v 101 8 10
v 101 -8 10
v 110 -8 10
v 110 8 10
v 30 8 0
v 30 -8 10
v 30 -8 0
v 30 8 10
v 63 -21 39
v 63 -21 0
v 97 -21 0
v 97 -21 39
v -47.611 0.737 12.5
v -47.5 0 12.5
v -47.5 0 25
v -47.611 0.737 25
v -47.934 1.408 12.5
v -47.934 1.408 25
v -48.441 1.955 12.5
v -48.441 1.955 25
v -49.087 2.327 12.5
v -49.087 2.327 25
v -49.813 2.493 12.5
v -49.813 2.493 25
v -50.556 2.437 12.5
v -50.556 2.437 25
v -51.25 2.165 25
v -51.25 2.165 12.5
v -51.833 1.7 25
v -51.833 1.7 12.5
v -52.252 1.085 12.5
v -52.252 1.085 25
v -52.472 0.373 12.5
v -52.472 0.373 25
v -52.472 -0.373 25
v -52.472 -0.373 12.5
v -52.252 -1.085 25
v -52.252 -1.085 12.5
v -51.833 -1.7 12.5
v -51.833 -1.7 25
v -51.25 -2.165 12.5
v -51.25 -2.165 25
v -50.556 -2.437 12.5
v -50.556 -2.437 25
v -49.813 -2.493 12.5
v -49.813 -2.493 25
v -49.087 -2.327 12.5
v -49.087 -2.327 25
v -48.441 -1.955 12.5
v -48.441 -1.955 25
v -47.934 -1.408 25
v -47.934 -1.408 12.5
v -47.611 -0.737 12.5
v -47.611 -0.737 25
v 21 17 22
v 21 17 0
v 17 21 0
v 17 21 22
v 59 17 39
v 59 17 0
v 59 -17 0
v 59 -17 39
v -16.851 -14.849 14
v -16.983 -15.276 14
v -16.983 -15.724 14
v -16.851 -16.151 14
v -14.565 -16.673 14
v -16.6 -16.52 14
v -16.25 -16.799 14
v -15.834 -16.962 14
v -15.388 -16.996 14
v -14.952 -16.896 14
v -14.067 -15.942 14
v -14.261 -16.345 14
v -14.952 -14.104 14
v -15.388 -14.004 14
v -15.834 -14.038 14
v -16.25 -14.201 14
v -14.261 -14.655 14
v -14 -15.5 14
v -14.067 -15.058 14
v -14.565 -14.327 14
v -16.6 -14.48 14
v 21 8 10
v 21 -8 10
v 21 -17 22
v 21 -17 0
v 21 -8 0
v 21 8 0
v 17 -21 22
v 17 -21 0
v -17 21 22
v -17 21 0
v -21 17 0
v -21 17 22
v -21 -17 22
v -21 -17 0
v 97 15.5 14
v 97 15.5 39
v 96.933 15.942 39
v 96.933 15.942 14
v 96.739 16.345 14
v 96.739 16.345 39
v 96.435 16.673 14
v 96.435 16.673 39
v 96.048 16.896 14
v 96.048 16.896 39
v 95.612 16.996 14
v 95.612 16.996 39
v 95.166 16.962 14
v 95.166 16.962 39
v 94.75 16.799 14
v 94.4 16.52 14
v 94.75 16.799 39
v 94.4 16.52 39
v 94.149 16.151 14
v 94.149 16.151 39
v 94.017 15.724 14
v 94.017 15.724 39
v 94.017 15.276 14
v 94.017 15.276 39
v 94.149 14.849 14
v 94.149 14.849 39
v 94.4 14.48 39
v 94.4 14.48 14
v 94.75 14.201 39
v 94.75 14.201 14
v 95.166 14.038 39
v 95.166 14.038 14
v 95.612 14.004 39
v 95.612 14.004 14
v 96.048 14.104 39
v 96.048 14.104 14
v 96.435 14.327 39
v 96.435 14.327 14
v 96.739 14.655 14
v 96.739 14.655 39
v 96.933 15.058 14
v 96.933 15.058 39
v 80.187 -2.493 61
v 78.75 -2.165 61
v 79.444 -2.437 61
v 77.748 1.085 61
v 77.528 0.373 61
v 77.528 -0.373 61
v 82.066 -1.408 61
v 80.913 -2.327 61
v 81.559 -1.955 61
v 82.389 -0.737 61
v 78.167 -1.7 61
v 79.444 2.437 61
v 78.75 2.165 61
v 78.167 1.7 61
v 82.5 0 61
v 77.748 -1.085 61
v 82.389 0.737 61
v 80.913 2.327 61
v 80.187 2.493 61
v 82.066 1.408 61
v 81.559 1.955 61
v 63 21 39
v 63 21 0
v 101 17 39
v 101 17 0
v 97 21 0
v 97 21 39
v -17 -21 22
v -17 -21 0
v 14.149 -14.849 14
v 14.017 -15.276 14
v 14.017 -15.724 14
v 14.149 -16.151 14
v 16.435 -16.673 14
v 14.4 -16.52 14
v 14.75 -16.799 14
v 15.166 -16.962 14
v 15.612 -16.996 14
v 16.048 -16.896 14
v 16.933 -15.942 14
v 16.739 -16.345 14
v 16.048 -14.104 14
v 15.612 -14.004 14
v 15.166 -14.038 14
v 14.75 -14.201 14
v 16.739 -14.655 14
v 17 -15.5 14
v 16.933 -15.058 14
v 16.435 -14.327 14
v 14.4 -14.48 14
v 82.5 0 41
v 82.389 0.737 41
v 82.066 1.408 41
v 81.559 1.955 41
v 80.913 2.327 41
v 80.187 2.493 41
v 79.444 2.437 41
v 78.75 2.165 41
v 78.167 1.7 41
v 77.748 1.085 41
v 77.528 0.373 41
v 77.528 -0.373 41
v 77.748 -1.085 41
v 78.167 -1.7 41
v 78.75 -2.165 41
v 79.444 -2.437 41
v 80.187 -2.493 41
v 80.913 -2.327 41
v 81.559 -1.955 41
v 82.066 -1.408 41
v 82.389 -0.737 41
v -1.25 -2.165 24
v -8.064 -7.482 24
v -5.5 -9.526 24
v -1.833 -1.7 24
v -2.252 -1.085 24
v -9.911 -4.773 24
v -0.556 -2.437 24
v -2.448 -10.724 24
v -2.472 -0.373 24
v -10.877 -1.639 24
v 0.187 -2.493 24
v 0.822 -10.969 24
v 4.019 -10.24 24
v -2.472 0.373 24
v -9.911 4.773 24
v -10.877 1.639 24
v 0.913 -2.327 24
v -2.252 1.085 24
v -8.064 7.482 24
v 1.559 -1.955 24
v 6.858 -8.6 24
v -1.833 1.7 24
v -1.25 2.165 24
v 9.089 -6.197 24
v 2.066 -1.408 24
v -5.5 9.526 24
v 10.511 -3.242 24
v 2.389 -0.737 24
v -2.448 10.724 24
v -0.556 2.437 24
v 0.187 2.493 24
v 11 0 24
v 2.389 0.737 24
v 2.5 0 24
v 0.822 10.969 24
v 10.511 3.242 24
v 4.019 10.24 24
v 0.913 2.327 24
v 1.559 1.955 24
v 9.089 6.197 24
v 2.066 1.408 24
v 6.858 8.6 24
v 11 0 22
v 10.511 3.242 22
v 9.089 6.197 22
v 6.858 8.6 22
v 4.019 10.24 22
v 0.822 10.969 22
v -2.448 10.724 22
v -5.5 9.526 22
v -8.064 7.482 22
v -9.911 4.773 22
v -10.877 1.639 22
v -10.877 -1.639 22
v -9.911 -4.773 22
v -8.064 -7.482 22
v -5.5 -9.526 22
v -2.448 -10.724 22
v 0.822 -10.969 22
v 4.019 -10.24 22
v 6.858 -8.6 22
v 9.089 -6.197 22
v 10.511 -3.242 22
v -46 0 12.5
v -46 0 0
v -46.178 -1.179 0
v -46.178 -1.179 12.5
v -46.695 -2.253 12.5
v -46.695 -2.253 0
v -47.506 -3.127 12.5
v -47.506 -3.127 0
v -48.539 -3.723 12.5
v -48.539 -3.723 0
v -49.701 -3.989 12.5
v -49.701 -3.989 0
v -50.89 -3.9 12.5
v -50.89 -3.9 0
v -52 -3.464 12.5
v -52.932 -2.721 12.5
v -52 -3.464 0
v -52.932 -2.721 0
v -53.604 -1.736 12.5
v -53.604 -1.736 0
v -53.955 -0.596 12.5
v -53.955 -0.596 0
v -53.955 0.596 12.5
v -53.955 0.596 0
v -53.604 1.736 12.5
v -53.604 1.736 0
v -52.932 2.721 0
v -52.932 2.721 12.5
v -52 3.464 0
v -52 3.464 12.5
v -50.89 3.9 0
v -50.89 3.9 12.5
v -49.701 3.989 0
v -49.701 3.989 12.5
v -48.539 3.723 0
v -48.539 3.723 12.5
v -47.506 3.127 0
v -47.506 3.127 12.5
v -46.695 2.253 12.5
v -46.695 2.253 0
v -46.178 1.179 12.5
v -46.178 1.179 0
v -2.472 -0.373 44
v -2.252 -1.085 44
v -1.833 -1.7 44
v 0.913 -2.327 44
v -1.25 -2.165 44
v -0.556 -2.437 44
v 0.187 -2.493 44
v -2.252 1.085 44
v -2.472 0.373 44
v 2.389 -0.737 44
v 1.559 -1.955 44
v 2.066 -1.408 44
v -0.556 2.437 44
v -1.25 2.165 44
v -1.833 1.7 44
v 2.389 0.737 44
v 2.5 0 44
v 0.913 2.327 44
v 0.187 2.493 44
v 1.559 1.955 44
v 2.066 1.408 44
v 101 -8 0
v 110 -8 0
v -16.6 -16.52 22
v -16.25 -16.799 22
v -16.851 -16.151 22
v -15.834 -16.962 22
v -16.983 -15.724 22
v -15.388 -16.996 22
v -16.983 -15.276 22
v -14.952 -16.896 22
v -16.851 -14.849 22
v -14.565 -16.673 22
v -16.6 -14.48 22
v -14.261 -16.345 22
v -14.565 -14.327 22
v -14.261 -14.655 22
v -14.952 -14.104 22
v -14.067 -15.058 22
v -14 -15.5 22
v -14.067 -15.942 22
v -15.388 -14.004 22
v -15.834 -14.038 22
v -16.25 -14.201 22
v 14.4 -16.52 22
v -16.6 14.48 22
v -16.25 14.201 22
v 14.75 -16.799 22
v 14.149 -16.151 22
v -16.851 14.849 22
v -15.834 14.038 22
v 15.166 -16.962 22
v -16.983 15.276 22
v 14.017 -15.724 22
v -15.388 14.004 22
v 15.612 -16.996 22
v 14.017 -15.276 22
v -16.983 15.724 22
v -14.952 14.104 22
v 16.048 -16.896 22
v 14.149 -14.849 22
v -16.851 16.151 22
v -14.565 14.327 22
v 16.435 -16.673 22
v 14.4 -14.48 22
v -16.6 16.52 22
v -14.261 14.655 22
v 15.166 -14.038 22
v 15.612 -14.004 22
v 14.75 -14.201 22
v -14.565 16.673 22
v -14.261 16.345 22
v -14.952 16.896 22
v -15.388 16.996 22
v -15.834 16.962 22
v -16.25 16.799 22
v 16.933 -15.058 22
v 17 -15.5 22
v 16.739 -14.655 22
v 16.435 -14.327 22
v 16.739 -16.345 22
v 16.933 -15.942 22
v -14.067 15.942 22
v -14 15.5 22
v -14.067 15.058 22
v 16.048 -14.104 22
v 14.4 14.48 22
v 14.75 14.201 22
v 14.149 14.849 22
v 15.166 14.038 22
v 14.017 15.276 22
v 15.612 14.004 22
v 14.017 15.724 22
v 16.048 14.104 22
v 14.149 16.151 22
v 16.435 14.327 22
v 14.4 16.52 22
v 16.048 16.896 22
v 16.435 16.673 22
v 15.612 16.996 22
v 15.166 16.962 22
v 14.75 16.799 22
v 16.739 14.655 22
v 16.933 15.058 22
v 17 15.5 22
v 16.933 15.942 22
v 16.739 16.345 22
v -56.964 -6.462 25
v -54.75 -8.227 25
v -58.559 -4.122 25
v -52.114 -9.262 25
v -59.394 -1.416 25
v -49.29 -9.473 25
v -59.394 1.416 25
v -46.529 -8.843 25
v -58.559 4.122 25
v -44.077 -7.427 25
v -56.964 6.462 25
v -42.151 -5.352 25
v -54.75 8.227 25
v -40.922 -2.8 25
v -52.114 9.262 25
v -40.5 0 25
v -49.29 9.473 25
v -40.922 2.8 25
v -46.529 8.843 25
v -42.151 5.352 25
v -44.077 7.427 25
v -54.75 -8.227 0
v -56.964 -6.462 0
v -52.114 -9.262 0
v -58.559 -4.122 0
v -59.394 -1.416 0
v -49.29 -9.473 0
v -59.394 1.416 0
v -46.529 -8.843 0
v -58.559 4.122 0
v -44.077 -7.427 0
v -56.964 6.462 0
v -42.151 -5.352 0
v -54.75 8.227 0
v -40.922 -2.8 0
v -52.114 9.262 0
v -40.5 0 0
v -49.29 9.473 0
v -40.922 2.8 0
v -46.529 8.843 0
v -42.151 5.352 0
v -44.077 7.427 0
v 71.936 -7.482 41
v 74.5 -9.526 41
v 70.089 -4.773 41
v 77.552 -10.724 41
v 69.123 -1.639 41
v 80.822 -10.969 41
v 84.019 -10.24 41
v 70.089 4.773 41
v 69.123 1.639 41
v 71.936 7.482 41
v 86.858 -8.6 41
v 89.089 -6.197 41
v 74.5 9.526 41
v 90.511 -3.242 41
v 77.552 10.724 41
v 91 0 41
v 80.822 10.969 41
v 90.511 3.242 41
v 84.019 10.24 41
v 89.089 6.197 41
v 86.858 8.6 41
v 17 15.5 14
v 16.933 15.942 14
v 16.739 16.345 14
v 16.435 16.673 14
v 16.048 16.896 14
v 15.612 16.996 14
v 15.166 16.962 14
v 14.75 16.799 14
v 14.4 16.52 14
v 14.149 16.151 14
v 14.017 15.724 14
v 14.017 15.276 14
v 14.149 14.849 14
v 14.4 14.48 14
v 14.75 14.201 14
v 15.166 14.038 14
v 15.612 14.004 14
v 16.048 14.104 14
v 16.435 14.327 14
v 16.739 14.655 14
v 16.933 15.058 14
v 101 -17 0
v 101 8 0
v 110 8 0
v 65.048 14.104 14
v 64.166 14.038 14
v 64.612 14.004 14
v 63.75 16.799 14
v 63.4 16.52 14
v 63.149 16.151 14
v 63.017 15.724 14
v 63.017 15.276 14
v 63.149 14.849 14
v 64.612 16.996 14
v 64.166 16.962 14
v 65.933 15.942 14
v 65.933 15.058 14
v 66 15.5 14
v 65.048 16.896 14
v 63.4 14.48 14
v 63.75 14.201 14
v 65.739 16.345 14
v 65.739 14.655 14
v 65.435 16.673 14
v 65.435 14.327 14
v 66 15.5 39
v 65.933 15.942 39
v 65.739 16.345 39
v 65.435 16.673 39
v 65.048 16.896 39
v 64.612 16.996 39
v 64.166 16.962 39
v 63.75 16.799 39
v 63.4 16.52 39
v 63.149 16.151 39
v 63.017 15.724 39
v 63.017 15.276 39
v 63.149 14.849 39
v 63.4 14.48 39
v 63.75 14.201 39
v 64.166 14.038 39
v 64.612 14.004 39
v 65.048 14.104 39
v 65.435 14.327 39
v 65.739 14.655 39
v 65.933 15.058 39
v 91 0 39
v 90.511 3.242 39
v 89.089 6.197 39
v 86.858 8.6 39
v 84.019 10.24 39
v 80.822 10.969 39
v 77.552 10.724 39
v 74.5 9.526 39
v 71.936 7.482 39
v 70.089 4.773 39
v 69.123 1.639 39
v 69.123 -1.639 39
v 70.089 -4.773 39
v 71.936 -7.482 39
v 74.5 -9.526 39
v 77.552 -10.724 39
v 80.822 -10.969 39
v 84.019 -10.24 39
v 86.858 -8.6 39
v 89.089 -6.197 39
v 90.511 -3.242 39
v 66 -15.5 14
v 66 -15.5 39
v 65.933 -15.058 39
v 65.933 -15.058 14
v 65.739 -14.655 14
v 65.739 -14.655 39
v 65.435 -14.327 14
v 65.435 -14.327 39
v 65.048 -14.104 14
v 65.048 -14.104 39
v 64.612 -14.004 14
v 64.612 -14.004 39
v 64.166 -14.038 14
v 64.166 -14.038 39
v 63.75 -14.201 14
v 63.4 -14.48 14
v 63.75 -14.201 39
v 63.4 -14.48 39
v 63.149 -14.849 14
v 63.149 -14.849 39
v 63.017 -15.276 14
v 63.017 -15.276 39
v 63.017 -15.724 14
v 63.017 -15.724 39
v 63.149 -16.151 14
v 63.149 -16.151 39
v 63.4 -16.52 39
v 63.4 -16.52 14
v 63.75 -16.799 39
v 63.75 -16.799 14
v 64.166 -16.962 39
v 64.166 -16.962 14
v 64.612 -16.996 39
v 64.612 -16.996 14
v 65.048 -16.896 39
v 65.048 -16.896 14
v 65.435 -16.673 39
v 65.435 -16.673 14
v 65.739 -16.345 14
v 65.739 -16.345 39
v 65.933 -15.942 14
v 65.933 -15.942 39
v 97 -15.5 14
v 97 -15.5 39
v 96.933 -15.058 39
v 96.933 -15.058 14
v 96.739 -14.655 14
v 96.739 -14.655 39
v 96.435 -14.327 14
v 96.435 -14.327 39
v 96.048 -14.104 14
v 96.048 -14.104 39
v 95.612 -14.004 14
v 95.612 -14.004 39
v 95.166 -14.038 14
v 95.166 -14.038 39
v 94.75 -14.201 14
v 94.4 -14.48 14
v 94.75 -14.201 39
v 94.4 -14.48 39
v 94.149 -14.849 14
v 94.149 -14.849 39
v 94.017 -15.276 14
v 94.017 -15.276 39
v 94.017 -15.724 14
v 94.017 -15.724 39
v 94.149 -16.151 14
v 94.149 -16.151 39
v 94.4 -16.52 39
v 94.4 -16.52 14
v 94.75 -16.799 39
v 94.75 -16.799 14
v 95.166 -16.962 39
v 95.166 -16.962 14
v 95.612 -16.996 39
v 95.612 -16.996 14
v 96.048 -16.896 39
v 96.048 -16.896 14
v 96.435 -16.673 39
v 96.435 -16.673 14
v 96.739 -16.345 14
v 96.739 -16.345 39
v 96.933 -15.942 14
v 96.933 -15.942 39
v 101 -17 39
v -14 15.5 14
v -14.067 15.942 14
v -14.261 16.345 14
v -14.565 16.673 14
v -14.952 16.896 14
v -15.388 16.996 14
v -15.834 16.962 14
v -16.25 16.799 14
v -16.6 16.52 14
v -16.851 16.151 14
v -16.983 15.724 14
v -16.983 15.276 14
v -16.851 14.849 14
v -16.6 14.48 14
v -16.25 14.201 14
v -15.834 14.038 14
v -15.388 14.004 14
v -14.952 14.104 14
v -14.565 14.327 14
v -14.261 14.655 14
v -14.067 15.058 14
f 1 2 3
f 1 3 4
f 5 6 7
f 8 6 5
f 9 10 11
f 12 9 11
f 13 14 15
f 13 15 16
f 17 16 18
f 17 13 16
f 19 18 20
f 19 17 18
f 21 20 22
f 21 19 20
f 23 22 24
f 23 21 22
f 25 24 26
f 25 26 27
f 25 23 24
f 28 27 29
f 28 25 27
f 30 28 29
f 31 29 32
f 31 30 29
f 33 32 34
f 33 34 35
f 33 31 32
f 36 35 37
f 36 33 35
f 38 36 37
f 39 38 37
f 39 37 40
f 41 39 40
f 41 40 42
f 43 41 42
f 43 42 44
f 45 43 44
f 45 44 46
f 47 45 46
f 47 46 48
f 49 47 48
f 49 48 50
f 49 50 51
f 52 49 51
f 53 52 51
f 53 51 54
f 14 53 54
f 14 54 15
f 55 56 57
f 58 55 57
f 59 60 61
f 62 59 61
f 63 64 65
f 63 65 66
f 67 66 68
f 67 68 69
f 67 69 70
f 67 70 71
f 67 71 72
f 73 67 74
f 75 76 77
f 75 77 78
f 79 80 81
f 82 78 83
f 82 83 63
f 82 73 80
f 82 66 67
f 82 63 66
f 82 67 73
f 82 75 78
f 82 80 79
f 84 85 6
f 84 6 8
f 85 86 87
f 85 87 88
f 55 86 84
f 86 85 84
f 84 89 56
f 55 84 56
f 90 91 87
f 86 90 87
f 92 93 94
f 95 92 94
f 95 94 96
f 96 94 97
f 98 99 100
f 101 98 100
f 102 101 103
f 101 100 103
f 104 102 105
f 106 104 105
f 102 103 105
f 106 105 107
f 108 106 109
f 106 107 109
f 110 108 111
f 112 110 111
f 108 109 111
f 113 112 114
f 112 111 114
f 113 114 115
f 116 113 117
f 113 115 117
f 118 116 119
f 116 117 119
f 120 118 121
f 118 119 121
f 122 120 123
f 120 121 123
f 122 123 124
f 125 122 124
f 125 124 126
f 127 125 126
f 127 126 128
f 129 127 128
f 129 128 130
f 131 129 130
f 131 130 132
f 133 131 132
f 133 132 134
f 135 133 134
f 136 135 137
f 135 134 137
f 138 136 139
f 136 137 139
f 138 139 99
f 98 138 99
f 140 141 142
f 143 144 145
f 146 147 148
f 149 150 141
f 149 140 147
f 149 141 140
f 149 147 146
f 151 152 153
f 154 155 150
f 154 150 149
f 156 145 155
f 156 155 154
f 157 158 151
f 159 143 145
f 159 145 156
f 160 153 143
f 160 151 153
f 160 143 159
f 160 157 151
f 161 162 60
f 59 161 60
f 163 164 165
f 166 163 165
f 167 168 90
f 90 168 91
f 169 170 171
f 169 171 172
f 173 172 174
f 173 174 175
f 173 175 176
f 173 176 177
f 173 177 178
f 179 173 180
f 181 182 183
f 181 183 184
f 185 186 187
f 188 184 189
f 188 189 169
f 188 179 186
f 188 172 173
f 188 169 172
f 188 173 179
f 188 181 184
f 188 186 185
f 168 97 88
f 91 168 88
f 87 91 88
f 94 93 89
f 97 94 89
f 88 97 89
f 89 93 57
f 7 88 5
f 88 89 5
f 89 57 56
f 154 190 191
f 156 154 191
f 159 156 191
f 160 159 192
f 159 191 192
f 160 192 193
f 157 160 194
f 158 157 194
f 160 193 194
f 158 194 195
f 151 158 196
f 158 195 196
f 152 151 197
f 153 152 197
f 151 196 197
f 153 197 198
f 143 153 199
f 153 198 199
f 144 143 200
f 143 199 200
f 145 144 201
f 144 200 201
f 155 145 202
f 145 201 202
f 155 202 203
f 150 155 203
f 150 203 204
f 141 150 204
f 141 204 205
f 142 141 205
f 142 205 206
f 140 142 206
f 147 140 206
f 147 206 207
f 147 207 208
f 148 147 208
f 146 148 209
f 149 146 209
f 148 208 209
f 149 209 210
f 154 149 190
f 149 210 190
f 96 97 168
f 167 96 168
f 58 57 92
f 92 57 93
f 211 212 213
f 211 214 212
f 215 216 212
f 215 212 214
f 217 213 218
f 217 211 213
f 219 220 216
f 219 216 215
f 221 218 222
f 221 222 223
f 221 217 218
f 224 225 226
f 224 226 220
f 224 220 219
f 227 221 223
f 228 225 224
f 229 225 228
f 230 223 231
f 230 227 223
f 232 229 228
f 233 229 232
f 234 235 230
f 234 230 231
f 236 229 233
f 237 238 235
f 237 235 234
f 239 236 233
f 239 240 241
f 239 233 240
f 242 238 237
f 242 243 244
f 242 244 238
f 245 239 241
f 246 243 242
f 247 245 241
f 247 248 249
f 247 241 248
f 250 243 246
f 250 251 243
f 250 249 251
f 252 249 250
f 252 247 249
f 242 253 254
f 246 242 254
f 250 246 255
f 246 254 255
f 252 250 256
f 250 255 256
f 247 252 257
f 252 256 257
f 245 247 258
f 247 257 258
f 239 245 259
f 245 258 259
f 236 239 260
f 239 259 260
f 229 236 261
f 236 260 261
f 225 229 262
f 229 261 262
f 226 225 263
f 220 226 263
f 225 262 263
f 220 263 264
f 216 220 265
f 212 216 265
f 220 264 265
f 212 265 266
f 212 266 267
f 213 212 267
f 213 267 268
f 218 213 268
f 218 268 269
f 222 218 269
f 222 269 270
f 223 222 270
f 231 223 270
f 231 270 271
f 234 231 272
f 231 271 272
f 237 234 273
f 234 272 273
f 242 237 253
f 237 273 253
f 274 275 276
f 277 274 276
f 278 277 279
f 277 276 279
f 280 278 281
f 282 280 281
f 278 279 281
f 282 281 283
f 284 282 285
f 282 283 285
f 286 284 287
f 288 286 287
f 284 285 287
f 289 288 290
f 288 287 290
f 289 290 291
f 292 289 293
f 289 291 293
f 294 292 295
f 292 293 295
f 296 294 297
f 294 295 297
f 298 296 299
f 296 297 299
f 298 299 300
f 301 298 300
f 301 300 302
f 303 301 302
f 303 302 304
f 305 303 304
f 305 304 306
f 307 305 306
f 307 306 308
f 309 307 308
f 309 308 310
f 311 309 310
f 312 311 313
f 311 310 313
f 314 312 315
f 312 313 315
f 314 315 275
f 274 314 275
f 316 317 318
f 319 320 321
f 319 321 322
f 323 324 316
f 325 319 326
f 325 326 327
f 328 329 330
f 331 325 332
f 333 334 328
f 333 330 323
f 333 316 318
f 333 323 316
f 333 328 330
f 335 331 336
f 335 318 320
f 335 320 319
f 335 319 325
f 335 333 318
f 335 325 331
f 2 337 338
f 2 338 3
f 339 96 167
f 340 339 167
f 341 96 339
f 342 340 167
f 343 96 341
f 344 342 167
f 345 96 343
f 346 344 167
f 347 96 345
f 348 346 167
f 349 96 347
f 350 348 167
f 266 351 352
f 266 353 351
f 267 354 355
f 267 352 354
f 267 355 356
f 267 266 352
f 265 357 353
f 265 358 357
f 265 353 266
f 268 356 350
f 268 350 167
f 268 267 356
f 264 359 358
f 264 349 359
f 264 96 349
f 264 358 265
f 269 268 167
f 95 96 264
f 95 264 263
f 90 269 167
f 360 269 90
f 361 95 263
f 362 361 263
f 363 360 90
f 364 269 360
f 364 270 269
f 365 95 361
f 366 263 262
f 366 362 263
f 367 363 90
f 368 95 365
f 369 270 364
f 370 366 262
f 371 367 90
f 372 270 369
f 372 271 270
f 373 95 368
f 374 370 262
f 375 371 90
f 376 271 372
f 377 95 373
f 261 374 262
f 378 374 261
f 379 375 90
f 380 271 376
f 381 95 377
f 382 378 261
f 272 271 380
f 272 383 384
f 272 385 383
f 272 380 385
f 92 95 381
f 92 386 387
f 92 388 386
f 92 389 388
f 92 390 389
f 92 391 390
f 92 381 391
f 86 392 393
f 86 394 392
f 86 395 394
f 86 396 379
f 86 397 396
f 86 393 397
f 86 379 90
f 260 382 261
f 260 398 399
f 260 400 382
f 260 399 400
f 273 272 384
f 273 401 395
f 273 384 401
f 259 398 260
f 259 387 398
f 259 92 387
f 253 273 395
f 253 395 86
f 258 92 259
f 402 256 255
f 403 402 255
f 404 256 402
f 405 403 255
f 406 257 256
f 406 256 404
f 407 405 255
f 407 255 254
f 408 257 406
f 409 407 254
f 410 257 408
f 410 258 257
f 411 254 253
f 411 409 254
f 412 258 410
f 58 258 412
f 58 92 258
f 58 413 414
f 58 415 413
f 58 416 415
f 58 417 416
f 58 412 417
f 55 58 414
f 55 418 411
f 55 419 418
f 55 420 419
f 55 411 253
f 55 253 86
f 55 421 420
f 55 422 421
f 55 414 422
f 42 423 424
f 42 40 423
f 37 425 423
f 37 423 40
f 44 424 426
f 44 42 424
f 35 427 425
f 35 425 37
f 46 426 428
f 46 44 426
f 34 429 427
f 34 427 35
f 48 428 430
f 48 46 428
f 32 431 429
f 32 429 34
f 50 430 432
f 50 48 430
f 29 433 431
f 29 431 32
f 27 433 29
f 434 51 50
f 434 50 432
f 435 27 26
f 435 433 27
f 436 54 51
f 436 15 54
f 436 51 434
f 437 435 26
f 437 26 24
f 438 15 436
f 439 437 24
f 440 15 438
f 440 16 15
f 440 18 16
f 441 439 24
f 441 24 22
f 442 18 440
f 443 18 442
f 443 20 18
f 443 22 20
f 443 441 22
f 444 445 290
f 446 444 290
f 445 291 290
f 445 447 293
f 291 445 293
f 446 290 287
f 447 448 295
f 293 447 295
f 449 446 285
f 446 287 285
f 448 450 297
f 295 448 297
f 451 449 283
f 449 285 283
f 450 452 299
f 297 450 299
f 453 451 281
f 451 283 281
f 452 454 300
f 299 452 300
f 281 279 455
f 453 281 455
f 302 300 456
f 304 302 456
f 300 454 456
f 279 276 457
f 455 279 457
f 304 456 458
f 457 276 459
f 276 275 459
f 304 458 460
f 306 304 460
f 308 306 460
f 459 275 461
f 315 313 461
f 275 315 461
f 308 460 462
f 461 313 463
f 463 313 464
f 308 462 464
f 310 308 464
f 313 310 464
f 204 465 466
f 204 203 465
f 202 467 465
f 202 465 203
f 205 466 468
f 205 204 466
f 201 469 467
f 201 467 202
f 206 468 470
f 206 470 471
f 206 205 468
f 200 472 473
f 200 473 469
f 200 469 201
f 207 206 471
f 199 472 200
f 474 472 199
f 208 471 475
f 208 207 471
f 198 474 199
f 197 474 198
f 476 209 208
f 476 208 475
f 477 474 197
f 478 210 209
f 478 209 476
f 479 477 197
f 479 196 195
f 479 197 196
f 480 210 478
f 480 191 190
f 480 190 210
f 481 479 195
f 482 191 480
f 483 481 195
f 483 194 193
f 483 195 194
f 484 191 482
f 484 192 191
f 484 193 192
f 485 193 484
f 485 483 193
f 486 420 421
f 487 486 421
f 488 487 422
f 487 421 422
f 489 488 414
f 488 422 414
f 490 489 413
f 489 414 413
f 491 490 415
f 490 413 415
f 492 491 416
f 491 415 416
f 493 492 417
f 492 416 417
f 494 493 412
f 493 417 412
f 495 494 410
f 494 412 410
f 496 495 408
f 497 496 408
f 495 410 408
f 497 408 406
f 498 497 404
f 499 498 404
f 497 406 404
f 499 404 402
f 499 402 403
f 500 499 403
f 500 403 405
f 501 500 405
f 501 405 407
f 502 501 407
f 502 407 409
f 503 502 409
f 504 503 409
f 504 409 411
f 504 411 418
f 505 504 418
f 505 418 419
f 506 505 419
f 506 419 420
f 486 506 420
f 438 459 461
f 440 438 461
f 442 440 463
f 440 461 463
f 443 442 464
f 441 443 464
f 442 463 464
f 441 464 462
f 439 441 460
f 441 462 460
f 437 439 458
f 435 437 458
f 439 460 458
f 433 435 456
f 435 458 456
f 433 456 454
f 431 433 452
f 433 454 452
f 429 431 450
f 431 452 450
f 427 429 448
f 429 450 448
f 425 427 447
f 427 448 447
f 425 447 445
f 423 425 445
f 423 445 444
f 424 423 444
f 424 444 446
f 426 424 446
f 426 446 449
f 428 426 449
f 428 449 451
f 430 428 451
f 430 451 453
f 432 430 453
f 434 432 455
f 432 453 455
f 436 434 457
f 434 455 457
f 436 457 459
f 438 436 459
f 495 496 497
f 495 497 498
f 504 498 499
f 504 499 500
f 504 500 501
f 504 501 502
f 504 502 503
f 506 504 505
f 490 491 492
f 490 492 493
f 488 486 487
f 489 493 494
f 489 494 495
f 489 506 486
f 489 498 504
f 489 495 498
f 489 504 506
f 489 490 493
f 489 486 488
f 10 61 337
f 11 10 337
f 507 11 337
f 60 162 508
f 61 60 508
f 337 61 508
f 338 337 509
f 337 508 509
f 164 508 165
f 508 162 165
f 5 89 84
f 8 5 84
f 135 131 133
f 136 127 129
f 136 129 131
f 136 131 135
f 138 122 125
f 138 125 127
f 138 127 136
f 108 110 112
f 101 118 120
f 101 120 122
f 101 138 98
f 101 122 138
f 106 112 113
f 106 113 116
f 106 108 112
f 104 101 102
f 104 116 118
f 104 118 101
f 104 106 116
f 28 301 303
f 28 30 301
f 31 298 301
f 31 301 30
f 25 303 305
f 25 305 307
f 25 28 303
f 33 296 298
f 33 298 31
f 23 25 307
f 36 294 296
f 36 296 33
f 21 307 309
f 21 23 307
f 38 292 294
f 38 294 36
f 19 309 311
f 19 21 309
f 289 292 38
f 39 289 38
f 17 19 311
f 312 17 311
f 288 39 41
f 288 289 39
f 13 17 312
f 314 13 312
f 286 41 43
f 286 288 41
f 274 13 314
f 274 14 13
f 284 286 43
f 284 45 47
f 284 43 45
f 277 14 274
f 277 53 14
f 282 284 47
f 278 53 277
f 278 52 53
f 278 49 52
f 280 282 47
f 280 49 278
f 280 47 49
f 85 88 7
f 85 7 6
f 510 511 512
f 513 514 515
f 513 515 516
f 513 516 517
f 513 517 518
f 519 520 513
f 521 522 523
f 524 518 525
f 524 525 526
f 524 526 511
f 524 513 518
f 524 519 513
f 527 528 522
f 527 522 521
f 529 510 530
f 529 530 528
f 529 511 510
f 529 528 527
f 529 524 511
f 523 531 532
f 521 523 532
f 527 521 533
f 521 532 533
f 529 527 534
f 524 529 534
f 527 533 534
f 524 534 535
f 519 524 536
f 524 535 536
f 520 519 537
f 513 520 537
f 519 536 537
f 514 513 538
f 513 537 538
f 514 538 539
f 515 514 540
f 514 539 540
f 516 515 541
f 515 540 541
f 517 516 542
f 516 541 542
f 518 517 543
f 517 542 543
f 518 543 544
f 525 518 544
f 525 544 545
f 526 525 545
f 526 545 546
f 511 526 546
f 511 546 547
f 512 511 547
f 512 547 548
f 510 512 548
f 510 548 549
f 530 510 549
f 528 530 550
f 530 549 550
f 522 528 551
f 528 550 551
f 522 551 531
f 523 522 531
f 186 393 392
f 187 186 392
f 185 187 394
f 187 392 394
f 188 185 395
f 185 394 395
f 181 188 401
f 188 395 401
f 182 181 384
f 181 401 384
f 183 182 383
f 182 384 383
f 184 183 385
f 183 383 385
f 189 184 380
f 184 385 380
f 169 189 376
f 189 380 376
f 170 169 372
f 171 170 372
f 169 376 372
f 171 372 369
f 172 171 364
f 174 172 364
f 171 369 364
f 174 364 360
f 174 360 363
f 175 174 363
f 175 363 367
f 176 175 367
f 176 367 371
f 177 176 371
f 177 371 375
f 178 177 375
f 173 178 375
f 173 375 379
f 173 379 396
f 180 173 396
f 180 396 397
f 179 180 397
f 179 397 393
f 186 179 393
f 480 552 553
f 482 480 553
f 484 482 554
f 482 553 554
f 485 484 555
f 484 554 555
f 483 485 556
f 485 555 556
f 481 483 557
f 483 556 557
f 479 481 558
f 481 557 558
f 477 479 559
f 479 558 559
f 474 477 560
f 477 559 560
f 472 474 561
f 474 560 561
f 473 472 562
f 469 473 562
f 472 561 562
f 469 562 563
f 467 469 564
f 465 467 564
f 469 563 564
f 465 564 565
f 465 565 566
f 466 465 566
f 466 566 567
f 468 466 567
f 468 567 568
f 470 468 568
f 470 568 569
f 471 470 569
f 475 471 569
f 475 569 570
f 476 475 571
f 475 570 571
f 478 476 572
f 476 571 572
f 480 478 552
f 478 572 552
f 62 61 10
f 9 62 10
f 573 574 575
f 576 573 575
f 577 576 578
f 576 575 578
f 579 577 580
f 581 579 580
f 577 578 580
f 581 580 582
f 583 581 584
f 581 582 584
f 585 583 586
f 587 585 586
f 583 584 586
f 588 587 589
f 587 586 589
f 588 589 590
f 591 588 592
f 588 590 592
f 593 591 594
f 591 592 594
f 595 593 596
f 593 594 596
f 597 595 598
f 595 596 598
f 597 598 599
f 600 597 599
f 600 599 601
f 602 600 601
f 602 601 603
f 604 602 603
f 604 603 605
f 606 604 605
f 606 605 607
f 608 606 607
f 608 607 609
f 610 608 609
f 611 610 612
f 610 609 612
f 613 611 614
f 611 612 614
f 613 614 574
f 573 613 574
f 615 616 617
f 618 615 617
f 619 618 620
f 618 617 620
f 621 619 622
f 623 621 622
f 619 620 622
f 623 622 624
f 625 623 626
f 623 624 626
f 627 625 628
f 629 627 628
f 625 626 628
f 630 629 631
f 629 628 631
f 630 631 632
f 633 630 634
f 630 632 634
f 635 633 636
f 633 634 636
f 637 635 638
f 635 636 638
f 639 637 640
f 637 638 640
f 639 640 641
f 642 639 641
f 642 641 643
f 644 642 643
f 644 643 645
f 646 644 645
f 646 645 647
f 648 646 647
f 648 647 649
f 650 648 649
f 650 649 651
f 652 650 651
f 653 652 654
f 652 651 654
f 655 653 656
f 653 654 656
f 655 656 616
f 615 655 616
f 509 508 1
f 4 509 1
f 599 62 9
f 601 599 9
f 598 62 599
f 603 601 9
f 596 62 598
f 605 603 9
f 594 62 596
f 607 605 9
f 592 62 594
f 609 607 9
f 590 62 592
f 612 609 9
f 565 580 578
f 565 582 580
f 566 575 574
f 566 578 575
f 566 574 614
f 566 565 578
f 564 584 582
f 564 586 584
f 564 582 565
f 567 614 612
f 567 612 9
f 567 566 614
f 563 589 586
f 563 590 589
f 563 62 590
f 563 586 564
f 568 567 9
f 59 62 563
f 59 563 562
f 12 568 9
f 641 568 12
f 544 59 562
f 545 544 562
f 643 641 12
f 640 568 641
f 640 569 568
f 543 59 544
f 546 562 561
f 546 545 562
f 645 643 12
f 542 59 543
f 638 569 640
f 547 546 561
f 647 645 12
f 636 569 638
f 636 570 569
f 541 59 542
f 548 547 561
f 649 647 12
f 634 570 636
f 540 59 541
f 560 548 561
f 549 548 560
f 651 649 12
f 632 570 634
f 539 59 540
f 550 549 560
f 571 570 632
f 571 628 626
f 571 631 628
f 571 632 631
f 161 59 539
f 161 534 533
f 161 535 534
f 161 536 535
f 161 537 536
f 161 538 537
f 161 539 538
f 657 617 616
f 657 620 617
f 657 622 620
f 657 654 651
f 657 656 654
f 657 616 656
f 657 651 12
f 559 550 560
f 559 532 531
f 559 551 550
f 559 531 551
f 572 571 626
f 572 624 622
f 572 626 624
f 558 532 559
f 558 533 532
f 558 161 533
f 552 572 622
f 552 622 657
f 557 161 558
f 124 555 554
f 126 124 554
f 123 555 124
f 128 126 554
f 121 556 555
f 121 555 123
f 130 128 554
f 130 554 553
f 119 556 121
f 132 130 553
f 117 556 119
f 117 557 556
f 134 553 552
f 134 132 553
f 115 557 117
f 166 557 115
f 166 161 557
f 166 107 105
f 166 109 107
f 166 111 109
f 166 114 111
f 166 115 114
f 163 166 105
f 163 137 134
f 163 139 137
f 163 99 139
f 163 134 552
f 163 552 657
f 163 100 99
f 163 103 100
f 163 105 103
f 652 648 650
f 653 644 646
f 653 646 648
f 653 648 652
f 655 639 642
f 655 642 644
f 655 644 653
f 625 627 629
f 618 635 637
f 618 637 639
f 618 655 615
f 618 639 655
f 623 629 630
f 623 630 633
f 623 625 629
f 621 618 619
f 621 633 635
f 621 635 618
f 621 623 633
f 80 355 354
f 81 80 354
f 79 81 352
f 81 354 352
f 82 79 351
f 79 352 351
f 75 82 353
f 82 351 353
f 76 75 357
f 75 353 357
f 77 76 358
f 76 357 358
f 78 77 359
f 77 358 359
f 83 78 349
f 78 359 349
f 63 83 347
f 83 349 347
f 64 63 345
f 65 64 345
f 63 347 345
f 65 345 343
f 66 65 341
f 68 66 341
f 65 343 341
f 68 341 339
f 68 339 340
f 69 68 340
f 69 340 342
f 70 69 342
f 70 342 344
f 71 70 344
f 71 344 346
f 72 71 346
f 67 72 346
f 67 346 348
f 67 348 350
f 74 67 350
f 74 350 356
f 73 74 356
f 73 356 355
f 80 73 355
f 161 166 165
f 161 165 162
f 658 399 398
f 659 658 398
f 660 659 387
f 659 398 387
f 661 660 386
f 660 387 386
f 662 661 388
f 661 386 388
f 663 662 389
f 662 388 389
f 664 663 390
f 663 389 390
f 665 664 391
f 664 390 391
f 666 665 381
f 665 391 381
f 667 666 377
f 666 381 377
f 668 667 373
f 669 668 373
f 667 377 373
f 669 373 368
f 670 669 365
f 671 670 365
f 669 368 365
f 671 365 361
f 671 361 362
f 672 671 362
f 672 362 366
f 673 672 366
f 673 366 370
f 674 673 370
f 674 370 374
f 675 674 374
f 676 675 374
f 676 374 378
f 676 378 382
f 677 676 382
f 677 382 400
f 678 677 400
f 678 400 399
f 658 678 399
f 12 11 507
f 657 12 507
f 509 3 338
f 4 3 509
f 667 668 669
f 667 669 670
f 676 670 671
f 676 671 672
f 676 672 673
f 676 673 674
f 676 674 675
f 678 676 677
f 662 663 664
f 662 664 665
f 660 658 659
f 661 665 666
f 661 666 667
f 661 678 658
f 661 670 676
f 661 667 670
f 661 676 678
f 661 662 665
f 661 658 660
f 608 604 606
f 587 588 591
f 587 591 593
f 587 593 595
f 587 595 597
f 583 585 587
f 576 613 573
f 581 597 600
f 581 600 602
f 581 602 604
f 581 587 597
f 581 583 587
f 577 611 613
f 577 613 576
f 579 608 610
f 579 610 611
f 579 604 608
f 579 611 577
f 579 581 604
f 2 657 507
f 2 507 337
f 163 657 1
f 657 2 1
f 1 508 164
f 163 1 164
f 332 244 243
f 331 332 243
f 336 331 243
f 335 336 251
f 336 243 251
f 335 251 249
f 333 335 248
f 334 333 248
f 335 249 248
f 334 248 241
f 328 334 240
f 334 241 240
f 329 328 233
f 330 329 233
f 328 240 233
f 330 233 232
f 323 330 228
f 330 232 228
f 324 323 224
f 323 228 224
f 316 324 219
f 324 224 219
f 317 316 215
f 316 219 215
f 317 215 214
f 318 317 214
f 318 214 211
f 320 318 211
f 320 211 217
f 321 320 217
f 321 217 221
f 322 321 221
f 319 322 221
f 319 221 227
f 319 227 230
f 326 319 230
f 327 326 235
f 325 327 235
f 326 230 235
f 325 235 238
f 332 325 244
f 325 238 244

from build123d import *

# Parameters (mm, degrees)
F1_DEPTH  = 39
F2_R      = 11
F3_DEPTH  = 2
F4_R      = 2.5
F5_DEPTH  = 20
F6_W      = 16
F6_H      = 10
F7_DEPTH  = 9
F12_DEPTH = 22
F13_R     = 11
F14_DEPTH = 2
F15_R     = 2.5
F16_DEPTH = 20
F17_W     = 16
F17_H     = 10
F18_DEPTH = 9
F19_R     = 9.5
F19_R_2   = 2.5
F20_DEPTH = 25
F21_R     = 4
F22_DEPTH = 12.5
F23_R     = 1.5
F24_DEPTH = 25


with BuildPart() as f1:
    # F0 (on Top) → F1 (new body)
    with BuildSketch(Plane.XY):
        Polygon((-17, 21), (-21, 17), (-21, -17), (-17, -21), (17, -21), (21, -17), (21, 17), (17, 21), align=None)
    extrude(amount=F1_DEPTH)

    # F2 (on face) → F3 (join)
    with BuildSketch(Plane.XY.offset(39)):
        Circle(F2_R)
    extrude(amount=F3_DEPTH)

    # F4 (on face) → F5 (join)
    with BuildSketch(Plane.XY.offset(41)):
        Circle(F4_R)
    extrude(amount=F5_DEPTH)

    # F6 (on face) → F7 (join)
    with BuildSketch(Plane.YZ.offset(21)):
        with Locations((0, 5)):
            Rectangle(F6_W, F6_H)
    extrude(amount=F7_DEPTH)


with BuildPart() as f8_1:
    # F8: copy of F1
    add(f1.part.moved(Location((82.6, 0, 0))))


with BuildPart() as f1_1:
    # F10: moved
    add(f1.part.moved(Location((80, 0, 0))))


with BuildPart() as f12:
    # F11 (on Top) → F12 (new body)
    with BuildSketch(Plane.XY):
        Polygon((-17, 21), (-21, 17), (-21, -17), (-17, -21), (17, -21), (21, -17), (21, 17), (17, 21), align=None)
    extrude(amount=F12_DEPTH)

    # F13 (on face) → F14 (join)
    with BuildSketch(Plane.XY.offset(22)):
        Circle(F13_R)
    extrude(amount=F14_DEPTH)

    # F15 (on face) → F16 (join)
    with BuildSketch(Plane.XY.offset(24)):
        Circle(F15_R)
    extrude(amount=F16_DEPTH)

    # F17 (on face) → F18 (join)
    with BuildSketch(Plane.YZ.offset(21)):
        with Locations((0, 5)):
            Rectangle(F17_W, F17_H)
    extrude(amount=F18_DEPTH)


with BuildPart() as f20:
    # F19 (on Top) → F20 (new body)
    with BuildSketch(Plane.XY):
        with Locations((-50, 0)):
            Circle(F19_R)
        with Locations((-50, 0)):
            Circle(F19_R_2, mode=Mode.SUBTRACT)
    extrude(amount=F20_DEPTH)

    # F21 (on face) → F22 (cut)
    with BuildSketch(Plane(origin=(0, 0, 0), x_dir=(1, 0, 0), z_dir=(0, 0, -1))):
        with Locations((-50, 0)):
            Circle(F21_R)
    extrude(amount=-F22_DEPTH, mode=Mode.SUBTRACT)


with BuildPart() as f24_tool:
    # F23 (on face) → F24 (new body)
    with BuildSketch(Plane.XY.offset(39)):
        with Locations((-15.5, 15.5)):
            Circle(F23_R)
        with Locations((15.5, 15.5)):
            Circle(F23_R)
        with Locations((15.5, -15.5)):
            Circle(F23_R)
        with Locations((-15.5, -15.5)):
            Circle(F23_R)
        with Locations((64.5, -15.5)):
            Circle(F23_R)
        with Locations((64.5, 15.5)):
            Circle(F23_R)
        with Locations((95.5, 15.5)):
            Circle(F23_R)
        with Locations((95.5, -15.5)):
            Circle(F23_R)
    extrude(amount=-F24_DEPTH)


with BuildPart() as f1_2:
    add(f1_1.part)

    # F24: cut by f24_tool
    add(f24_tool.part, mode=Mode.SUBTRACT)


with BuildPart() as f12_1:
    add(f12.part)

    # F24: cut by f24_tool
    add(f24_tool.part, mode=Mode.SUBTRACT)


solid = Compound([f20.part, f1_2.part, f12_1.part])
